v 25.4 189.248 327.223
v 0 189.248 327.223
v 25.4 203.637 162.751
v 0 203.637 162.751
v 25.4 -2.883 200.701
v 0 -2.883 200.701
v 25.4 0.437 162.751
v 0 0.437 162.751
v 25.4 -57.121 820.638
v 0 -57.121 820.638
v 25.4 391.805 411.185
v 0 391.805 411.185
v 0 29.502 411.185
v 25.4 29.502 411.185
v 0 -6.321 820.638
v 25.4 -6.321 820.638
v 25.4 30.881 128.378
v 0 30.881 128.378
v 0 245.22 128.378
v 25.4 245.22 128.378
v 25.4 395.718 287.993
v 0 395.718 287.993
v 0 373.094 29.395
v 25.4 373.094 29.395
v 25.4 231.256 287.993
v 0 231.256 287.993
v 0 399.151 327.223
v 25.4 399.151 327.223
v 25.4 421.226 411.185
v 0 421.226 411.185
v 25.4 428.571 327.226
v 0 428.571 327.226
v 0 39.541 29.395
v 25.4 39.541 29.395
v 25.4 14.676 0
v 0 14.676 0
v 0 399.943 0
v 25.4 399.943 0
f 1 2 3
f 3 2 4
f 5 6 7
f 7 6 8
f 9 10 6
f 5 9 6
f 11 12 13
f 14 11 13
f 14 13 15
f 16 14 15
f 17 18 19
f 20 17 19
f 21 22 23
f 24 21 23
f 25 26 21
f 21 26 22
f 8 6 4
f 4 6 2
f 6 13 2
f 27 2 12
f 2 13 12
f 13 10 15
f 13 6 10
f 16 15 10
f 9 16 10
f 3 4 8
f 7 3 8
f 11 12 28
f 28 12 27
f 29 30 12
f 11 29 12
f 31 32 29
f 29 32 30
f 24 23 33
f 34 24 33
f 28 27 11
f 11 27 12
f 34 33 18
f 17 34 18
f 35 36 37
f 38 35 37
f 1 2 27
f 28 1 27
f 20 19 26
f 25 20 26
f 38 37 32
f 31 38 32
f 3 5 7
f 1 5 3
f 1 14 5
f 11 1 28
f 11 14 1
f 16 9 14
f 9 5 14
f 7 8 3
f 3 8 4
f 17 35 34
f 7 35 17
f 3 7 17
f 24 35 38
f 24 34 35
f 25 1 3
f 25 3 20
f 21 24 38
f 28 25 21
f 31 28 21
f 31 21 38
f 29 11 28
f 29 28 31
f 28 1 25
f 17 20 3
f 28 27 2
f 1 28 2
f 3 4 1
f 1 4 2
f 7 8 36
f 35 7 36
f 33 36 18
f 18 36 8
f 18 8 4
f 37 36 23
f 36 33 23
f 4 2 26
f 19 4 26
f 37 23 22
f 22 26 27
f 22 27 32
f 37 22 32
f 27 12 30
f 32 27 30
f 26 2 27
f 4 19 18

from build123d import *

# Parameters (mm, degrees)
F1_DEPTH = 25.4
F2_DEPTH = 25.4


# Not quite as in the source:
# - a feature names something its author has since deleted; it is built from what else it names


with BuildPart() as f1:
    # F0 (on Right) → F1 (new body)
    with BuildSketch(Plane.YZ):
        Polygon((-2.8831724243, 200.7012711329), (0.4370540533, 162.7509088374), (203.6370540533, 162.7509088374), (189.2476409256, 327.2226534924), (399.1505950094, 327.2226534924), (391.8048532493, 411.1848660134), (29.5018991655, 411.1848660134), (-6.3205984573, 820.6378874572), (-57.1205984573, 820.6378874572), (-21.1470656382, 409.4585258199), align=None)
    extrude(amount=F1_DEPTH)


with BuildPart() as f2:
    # F0 (on Right) → F2 (new body)
    with BuildSketch(Plane.YZ):
        Polygon((0.4370540533, 162.7509088374), (14.6759135551, 0), (42.1129448534, 0), (39.5412336167, 29.3947939436), (30.8813626048, 128.3775725444), (205.7059179631, 128.3775725444), (245.2201617377, 128.3775725444), (231.2555789637, 287.9934840373), (395.7184874025, 287.9934840373), (399.1505950094, 327.2226534924), (189.2476409256, 327.2226534924), (203.6370540533, 162.7509088374), align=None)
        Polygon((391.8048532493, 411.1848660134), (399.1505950094, 327.2226534924), (428.5714484425, 327.2258416546), (421.2259856104, 411.1848660134), align=None)
        Polygon((428.5714484425, 327.2258416546), (399.1505950094, 327.2226534924), (395.7184874025, 287.9934840373), (373.0940336167, 29.3947939436), (370.5223223799, 0), (399.942896885, 0), align=None)
        Polygon((39.5412336167, 29.3947939436), (42.1129448534, 0), (216.9375002117, 0), (256.4517439863, 0), (253.8800327496, 29.3947939436), align=None)
        Polygon((253.8800327496, 29.3947939436), (256.4517439863, 0), (370.5223223799, 0), (373.0940336167, 29.3947939436), align=None)
    extrude(amount=F2_DEPTH)


solid = Compound([f1.part, f2.part])
